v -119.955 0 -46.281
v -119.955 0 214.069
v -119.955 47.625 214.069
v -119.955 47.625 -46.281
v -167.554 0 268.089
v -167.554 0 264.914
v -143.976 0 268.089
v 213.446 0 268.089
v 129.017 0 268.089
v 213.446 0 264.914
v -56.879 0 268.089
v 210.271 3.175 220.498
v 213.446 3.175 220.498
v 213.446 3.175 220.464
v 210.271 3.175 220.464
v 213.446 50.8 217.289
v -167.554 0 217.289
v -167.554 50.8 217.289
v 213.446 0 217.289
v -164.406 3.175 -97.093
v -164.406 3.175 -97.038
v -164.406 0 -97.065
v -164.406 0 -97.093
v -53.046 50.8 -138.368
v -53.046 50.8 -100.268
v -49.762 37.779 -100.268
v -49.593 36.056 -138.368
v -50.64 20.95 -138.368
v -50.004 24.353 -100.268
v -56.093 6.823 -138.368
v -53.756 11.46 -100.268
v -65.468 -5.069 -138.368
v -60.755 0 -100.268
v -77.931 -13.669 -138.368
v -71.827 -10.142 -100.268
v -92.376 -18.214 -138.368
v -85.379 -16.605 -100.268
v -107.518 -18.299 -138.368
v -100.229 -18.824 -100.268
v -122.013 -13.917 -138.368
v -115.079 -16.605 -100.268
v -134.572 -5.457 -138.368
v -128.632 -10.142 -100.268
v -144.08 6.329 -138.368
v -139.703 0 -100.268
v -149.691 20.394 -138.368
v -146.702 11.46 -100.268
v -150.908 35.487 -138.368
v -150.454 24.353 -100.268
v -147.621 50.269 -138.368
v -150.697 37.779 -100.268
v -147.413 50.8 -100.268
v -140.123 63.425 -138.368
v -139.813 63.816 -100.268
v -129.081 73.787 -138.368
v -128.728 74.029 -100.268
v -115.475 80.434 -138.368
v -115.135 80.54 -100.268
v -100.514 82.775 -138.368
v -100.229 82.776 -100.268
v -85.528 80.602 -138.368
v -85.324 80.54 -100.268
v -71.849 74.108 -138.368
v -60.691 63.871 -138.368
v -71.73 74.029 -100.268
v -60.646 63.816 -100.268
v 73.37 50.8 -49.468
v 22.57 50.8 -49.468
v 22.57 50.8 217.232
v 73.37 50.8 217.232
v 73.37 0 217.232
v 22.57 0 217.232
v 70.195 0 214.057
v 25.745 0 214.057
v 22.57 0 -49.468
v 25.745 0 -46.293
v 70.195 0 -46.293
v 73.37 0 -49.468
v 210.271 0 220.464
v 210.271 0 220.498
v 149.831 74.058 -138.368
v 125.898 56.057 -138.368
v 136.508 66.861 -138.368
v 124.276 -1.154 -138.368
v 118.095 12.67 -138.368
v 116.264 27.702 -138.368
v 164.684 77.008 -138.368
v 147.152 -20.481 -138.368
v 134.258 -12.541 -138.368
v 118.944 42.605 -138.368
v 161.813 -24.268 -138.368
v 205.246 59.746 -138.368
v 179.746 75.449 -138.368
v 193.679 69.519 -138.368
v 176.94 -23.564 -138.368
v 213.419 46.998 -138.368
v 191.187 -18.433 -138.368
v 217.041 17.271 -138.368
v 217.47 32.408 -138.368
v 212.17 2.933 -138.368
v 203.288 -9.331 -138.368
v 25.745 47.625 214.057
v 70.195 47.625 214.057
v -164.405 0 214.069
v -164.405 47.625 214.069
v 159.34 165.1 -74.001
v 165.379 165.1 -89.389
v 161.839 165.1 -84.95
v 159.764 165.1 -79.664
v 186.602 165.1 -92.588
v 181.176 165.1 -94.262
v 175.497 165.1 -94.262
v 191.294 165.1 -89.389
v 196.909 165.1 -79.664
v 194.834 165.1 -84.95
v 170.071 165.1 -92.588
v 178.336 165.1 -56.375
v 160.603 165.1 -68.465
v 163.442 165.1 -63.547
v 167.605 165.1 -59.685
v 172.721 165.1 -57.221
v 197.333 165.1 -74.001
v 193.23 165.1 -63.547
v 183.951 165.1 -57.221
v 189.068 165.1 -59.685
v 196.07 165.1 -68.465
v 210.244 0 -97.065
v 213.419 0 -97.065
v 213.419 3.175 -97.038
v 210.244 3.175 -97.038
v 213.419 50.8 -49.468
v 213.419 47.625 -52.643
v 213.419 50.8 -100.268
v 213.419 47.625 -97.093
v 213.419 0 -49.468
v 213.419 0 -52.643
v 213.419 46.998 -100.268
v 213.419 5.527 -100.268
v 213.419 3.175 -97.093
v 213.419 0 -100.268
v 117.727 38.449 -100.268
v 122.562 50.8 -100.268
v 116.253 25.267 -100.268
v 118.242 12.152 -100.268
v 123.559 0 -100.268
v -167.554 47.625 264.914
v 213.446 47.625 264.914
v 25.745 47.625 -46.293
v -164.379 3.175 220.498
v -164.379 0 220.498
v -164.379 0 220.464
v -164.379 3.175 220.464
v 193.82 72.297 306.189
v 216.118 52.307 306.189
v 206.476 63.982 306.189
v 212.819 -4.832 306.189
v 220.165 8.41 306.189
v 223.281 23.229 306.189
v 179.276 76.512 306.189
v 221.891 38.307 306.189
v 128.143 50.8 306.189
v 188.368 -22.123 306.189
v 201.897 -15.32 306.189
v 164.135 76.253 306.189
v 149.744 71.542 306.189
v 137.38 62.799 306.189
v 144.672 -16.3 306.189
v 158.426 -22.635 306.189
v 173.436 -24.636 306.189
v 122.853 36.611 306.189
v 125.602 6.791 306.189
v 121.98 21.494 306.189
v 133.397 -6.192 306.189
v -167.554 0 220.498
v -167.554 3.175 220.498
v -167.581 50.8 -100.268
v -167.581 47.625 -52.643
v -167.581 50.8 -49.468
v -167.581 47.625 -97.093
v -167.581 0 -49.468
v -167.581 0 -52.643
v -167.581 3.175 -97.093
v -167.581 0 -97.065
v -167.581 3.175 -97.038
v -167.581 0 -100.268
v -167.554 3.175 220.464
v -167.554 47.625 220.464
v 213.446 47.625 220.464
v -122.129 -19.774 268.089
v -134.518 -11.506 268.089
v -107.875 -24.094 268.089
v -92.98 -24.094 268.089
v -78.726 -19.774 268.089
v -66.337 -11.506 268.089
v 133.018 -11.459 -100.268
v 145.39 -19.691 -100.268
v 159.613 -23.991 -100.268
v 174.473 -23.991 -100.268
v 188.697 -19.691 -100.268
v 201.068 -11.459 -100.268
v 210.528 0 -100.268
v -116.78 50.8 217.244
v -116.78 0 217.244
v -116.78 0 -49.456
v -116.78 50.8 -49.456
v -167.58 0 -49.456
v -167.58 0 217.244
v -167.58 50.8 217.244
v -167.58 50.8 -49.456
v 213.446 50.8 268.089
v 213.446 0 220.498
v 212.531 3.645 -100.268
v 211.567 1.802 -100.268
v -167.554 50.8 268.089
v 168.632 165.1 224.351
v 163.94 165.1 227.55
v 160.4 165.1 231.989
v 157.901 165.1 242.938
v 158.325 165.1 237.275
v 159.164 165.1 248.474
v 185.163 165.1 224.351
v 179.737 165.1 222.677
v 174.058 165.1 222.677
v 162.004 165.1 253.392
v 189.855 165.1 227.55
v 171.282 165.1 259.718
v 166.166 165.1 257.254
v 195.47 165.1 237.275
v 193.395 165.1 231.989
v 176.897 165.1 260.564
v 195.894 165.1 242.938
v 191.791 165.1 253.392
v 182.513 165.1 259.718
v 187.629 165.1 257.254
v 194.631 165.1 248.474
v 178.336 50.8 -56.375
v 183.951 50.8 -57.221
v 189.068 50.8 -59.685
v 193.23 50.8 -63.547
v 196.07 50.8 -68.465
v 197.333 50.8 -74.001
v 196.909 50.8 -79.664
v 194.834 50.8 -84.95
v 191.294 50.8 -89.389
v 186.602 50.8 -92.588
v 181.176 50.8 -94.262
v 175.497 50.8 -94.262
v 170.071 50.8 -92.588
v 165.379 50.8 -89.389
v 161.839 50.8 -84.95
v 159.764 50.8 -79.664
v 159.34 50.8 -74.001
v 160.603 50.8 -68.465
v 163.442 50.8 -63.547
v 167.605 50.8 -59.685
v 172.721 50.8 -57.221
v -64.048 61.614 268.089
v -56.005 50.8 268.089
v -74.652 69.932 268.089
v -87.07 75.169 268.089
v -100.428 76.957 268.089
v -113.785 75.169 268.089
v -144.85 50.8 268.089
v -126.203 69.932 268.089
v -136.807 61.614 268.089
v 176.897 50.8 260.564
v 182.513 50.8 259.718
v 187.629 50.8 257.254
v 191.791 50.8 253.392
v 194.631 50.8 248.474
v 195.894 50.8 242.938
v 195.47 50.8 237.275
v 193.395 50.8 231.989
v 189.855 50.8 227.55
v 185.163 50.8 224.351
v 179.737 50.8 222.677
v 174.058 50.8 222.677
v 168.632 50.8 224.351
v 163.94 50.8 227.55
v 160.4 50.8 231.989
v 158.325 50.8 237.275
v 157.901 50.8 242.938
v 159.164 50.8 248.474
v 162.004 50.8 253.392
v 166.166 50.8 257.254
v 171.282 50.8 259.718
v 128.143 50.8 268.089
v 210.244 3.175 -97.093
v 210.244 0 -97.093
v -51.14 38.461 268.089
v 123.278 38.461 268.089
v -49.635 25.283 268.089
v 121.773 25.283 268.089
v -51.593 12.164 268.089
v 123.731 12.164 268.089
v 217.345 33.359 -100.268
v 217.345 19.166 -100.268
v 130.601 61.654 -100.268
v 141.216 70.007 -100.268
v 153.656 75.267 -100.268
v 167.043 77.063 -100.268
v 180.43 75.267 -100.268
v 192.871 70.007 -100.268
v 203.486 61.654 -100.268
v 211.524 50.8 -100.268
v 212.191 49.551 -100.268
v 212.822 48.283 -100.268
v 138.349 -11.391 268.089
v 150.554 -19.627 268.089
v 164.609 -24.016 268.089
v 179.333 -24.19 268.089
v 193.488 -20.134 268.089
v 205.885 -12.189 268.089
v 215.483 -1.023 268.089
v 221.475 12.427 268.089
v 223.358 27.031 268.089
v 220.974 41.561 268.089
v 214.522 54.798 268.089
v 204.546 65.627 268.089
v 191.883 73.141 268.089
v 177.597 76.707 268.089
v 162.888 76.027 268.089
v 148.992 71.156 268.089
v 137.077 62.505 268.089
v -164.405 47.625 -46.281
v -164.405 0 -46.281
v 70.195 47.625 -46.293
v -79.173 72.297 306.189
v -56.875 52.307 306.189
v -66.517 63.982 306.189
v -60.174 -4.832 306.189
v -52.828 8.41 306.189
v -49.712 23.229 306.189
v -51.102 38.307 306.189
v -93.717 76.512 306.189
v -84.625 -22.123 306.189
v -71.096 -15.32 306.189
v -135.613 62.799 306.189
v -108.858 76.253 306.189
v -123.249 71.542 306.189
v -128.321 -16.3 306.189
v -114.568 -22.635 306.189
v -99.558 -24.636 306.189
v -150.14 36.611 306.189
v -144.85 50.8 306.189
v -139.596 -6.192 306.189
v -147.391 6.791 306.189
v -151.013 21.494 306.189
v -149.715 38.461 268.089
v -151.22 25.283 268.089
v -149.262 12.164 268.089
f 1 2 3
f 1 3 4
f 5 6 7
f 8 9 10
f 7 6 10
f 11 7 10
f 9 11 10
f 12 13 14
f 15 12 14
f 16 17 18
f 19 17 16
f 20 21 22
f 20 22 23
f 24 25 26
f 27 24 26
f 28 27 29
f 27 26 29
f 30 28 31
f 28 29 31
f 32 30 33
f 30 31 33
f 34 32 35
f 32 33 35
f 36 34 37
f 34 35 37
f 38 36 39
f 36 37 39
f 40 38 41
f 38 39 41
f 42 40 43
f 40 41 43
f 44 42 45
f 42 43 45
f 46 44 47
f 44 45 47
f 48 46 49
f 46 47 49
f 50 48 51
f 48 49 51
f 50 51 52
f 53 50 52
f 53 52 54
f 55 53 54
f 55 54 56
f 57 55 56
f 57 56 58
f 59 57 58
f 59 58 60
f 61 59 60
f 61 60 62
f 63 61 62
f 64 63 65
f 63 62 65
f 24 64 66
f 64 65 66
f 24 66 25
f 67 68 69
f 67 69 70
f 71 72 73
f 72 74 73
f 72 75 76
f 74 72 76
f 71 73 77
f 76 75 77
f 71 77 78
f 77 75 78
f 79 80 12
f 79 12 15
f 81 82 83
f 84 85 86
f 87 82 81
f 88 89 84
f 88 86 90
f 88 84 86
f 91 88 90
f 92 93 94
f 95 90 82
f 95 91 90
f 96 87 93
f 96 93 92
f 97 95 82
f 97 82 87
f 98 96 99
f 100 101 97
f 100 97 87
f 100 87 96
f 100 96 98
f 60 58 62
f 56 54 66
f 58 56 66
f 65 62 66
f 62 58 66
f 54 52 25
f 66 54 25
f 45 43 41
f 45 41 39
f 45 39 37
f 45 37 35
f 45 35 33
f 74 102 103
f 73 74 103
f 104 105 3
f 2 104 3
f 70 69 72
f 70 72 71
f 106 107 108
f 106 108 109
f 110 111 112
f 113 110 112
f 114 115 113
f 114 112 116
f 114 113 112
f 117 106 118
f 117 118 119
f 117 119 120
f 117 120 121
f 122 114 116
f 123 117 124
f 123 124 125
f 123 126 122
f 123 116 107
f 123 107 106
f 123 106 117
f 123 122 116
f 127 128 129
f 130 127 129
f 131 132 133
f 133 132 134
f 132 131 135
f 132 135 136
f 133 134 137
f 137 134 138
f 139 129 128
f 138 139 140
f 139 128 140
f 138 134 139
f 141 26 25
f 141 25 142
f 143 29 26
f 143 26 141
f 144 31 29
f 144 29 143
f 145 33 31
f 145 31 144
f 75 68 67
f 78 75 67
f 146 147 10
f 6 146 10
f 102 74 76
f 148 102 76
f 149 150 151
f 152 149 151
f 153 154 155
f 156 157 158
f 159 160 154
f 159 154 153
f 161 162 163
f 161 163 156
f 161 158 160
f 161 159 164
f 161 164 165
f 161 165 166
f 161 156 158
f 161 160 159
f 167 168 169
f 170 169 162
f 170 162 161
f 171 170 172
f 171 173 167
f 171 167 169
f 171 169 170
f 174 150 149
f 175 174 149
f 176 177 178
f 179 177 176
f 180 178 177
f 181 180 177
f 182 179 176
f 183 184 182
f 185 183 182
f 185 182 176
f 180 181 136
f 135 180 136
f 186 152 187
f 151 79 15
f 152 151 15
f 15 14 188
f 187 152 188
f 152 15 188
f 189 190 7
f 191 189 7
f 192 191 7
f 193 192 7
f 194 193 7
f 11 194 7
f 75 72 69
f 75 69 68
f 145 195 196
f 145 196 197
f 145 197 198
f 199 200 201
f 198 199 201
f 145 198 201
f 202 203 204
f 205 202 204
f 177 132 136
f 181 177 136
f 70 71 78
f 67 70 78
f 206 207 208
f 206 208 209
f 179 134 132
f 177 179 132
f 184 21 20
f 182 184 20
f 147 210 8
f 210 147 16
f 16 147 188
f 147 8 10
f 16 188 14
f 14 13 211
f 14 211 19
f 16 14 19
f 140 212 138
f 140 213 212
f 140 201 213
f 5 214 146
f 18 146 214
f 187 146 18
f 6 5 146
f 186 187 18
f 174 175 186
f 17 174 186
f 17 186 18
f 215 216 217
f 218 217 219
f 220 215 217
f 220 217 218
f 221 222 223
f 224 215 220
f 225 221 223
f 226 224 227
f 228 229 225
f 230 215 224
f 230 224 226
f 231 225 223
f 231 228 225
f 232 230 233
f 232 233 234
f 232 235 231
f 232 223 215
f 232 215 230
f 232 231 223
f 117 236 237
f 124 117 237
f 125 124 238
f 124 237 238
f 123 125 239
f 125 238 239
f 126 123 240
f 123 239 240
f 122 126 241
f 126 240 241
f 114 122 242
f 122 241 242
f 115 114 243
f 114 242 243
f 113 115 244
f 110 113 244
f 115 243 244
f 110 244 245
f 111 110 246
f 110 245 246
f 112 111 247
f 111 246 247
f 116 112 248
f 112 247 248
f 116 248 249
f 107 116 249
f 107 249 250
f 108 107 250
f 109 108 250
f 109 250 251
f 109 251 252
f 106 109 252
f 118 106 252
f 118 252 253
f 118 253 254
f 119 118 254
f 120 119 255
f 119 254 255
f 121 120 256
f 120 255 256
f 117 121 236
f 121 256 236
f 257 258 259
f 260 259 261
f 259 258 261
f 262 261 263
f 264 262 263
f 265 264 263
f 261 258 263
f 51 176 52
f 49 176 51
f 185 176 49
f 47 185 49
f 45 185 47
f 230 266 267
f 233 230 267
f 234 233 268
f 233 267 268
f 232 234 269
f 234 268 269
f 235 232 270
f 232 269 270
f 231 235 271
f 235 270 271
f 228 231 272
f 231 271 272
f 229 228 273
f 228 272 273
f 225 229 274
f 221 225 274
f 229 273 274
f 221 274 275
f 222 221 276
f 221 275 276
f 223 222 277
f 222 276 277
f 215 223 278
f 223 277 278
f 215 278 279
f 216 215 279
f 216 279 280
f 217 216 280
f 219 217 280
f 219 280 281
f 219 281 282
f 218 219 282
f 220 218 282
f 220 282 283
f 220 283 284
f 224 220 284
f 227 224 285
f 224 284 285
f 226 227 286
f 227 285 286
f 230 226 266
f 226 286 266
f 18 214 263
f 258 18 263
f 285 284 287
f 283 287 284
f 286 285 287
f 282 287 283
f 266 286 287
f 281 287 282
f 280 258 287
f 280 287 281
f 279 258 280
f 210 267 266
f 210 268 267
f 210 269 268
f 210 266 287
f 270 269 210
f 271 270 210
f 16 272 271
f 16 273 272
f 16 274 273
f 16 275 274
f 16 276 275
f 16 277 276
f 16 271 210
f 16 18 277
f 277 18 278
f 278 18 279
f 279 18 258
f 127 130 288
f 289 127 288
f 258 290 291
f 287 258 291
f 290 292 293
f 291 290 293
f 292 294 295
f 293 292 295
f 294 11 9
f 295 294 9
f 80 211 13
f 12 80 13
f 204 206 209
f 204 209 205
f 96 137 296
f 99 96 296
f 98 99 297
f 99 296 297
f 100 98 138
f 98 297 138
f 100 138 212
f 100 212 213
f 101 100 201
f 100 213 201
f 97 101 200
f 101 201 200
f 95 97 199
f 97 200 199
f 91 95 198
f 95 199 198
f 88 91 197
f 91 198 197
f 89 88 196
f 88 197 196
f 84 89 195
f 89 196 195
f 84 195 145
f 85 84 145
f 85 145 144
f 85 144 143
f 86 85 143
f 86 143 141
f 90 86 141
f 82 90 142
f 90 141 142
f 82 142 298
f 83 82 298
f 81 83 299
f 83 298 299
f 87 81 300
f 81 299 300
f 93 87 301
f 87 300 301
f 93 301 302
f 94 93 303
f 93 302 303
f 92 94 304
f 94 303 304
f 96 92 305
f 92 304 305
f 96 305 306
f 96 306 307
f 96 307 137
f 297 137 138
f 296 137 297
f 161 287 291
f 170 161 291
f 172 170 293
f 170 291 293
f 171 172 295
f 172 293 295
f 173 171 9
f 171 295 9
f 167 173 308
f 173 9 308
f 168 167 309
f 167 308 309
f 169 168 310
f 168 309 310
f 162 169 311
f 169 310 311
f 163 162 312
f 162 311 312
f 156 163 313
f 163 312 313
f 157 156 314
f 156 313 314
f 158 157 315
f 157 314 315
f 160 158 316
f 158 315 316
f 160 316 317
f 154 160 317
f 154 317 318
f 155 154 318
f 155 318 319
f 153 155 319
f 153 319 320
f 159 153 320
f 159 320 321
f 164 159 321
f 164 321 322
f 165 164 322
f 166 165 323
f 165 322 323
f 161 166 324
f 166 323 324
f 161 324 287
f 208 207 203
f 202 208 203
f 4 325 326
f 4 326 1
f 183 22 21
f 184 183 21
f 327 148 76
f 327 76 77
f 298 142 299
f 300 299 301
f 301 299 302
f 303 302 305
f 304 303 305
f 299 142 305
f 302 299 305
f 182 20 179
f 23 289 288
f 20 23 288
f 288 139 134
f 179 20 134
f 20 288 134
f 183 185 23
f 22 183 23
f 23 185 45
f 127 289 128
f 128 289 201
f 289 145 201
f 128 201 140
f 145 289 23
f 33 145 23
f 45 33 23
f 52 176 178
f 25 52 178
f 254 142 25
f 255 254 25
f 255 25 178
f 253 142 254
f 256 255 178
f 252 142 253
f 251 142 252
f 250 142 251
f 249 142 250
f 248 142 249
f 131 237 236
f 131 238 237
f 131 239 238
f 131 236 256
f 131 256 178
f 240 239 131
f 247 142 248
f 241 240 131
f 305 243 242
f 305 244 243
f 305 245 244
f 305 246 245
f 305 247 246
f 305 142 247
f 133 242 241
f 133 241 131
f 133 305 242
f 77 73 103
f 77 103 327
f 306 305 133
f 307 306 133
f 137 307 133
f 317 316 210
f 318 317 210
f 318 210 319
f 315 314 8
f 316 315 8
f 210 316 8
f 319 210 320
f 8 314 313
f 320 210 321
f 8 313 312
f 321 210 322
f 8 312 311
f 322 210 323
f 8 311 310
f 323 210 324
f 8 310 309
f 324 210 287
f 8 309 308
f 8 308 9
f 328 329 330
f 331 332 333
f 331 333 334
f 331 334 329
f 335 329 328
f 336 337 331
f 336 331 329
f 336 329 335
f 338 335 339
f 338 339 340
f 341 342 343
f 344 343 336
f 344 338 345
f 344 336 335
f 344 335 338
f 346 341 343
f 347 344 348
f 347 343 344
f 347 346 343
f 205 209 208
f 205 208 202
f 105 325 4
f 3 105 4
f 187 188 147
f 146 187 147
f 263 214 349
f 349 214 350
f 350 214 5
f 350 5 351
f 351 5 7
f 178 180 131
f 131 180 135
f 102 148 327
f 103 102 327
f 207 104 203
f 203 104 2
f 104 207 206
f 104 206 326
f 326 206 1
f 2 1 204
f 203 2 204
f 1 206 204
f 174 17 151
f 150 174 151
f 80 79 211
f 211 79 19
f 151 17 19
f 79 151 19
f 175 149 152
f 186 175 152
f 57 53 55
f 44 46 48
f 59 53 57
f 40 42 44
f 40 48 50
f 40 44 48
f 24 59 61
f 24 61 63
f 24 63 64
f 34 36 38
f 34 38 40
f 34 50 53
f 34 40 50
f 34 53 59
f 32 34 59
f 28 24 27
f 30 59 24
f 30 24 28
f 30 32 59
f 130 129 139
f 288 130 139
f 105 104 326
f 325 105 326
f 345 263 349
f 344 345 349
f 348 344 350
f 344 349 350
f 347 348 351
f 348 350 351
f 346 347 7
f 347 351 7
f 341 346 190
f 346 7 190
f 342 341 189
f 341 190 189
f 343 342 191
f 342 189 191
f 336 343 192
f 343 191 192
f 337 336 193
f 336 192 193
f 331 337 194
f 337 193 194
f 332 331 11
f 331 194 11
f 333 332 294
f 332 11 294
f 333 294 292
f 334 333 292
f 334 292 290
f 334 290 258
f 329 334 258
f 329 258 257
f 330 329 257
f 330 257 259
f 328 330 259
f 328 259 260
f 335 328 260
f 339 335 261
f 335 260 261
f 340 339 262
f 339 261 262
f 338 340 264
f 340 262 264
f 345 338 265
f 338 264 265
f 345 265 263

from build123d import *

# Parameters (mm, degrees)
SKETCH1_W             = 50.8
SKETCH1_H             = 266.7
BOSS_EXTRUDE1_DEPTH   = 50.8
SKETCH1_W_2           = 381
SKETCH1_H_2           = 50.8
BOSS_EXTRUDE1_2_DEPTH = 50.8
BOSS_EXTRUDE1_3_DEPTH = 50.8
BOSS_EXTRUDE1_4_DEPTH = 50.8
SHELL1_T              = -3.175
SHELL2_T              = -3.175
SHELL3_T              = -3.175
SHELL4_T              = -3.175
CUT_EXTRUDE2_DEPTH    = 448.056
CUT_EXTRUDE3_DEPTH    = 448.056
SKETCH4_R             = 19.05
BOSS_EXTRUDE2_DEPTH   = 114.3
SKETCH5_R             = 50.8
BOSS_EXTRUDE3_DEPTH   = 38.1
SKETCH6_R             = 50.8
BOSS_EXTRUDE5_DEPTH   = 38.1


with BuildPart() as part:
    # Sketch1 → Boss-Extrude1 (new body)
    with BuildSketch(Plane(origin=(0, 0, 0), x_dir=(1, 0, 0), z_dir=(0, 1, 0))):
        with Locations((-142.180377161, -83.893954499)):
            Rectangle(SKETCH1_W, SKETCH1_H)
    extrude(amount=BOSS_EXTRUDE1_DEPTH)

    # Shell3
    shell3_openings = [part.faces().sort_by_distance(p)[0] for p in [
        (-142.180377161, 0, 83.893954499),
    ]]
    offset(amount=SHELL3_T, openings=shell3_openings, kind=Kind.INTERSECTION)


with BuildPart() as body_2:
    # Sketch1 → Boss-Extrude1 2 (new body)
    with BuildSketch(Plane(origin=(0, 0, 0), x_dir=(1, 0, 0), z_dir=(0, 1, 0))):
        with Locations((22.945685454, -242.688539791)):
            Rectangle(SKETCH1_W_2, SKETCH1_H_2)
    extrude(amount=BOSS_EXTRUDE1_2_DEPTH)

    # Shell1
    shell1_openings = [body_2.faces().sort_by_distance(p)[0] for p in [
        (22.945685454, 0, 242.688539791),
    ]]
    offset(amount=SHELL1_T, openings=shell1_openings, kind=Kind.INTERSECTION)

    # Sketch2 → Cut-Extrude2 (cut)
    with BuildSketch(Plane(origin=(213.445685454, 0, 0), x_dir=(0, 0, -1), z_dir=(1, 0, 0))):
        Polygon((-264.913539791, 3.175), (-264.913539791, 0), (-220.49774804, 0), (-220.49774804, 3.175), (-220.463539791, 3.175), (-220.463539791, 47.625), (-264.913539791, 47.625), align=None)
    extrude(amount=-CUT_EXTRUDE2_DEPTH, mode=Mode.SUBTRACT)



with BuildPart() as body_3:
    # Sketch1 → Boss-Extrude1 3 (new body)
    with BuildSketch(Plane(origin=(0, 0, 0), x_dir=(1, 0, 0), z_dir=(0, 1, 0))):
        with Locations((22.918502853, 74.867899704)):
            Rectangle(SKETCH1_W_2, SKETCH1_H_2)
    extrude(amount=BOSS_EXTRUDE1_3_DEPTH)

    # Shell4
    shell4_openings = [body_3.faces().sort_by_distance(p)[0] for p in [
        (22.918502853, 0, -74.867899704),
    ]]
    offset(amount=SHELL4_T, openings=shell4_openings, kind=Kind.INTERSECTION)

    # Sketch3 → Cut-Extrude3 (cut)
    with BuildSketch(Plane(origin=(213.418502853, 0, 0), x_dir=(0, 0, -1), z_dir=(1, 0, 0))):
        Polygon((52.642899704, 3.175), (52.642899704, 0), (97.06541915, 0), (97.037938595, 3.175), (97.092899704, 3.175), (97.092899704, 47.625), (52.642899704, 47.625), align=None)
    extrude(amount=-CUT_EXTRUDE3_DEPTH, mode=Mode.SUBTRACT)


with BuildPart() as body_4:
    # Sketch1 → Boss-Extrude1 4 (new body)
    with BuildSketch(Plane(origin=(0, 0, 0), x_dir=(1, 0, 0), z_dir=(0, 1, 0))):
        with Locations((47.970482345, -83.882493933)):
            Rectangle(SKETCH1_W, SKETCH1_H)
    extrude(amount=BOSS_EXTRUDE1_4_DEPTH)

    # Shell2
    shell2_openings = [body_4.faces().sort_by_distance(p)[0] for p in [
        (47.970482345, 0, 83.882493933),
    ]]
    offset(amount=SHELL2_T, openings=shell2_openings, kind=Kind.INTERSECTION)


with BuildPart() as body_2_1:
    add(body_2.part)

    add(body_3.part)  # Boss-Extrude2 merges body 3
    # Sketch4 → Boss-Extrude2 (add)
    with BuildSketch(Plane(origin=(0, 50.8, 0), x_dir=(1, 0, 0), z_dir=(0, 1, 0))):
        with Locations(Location((176.89745747, -241.514307843, 0), (0, 0, 270))):
            Circle(SKETCH4_R)
        with Locations(Location((178.336360526, 75.424713992, 0), (0, 0, 270))):
            Circle(SKETCH4_R)
    extrude(amount=BOSS_EXTRUDE2_DEPTH)

    # Sketch5 → Boss-Extrude3 (add)
    with BuildSketch(Plane.XY.offset(268.088539791)):
        with Locations(Location((172.565739008, 26.157020355, 0), (0, 0, 150.981105093))):
            Circle(SKETCH5_R)
        with Locations(Location((-100.427548821, 26.157020355, 0), (0, 0, 150.981105093))):
            Circle(SKETCH5_R)
    extrude(amount=BOSS_EXTRUDE3_DEPTH)

    # Sketch6 → Boss-Extrude5 (add)
    with BuildSketch(Plane(origin=(0, 0, -100.267899704), x_dir=(-1, 0, 0), z_dir=(0, 0, -1))):
        with Locations(Location((-167.043243637, 26.262501017, 0), (0, 0, 155.909069776))):
            Circle(SKETCH6_R)
        with Locations(Location((100.229205576, 31.97555496, 0), (0, 0, 158.249845522))):
            Circle(SKETCH6_R)
    extrude(amount=BOSS_EXTRUDE5_DEPTH)


solid = Compound([part.part, body_4.part, body_2_1.part])
